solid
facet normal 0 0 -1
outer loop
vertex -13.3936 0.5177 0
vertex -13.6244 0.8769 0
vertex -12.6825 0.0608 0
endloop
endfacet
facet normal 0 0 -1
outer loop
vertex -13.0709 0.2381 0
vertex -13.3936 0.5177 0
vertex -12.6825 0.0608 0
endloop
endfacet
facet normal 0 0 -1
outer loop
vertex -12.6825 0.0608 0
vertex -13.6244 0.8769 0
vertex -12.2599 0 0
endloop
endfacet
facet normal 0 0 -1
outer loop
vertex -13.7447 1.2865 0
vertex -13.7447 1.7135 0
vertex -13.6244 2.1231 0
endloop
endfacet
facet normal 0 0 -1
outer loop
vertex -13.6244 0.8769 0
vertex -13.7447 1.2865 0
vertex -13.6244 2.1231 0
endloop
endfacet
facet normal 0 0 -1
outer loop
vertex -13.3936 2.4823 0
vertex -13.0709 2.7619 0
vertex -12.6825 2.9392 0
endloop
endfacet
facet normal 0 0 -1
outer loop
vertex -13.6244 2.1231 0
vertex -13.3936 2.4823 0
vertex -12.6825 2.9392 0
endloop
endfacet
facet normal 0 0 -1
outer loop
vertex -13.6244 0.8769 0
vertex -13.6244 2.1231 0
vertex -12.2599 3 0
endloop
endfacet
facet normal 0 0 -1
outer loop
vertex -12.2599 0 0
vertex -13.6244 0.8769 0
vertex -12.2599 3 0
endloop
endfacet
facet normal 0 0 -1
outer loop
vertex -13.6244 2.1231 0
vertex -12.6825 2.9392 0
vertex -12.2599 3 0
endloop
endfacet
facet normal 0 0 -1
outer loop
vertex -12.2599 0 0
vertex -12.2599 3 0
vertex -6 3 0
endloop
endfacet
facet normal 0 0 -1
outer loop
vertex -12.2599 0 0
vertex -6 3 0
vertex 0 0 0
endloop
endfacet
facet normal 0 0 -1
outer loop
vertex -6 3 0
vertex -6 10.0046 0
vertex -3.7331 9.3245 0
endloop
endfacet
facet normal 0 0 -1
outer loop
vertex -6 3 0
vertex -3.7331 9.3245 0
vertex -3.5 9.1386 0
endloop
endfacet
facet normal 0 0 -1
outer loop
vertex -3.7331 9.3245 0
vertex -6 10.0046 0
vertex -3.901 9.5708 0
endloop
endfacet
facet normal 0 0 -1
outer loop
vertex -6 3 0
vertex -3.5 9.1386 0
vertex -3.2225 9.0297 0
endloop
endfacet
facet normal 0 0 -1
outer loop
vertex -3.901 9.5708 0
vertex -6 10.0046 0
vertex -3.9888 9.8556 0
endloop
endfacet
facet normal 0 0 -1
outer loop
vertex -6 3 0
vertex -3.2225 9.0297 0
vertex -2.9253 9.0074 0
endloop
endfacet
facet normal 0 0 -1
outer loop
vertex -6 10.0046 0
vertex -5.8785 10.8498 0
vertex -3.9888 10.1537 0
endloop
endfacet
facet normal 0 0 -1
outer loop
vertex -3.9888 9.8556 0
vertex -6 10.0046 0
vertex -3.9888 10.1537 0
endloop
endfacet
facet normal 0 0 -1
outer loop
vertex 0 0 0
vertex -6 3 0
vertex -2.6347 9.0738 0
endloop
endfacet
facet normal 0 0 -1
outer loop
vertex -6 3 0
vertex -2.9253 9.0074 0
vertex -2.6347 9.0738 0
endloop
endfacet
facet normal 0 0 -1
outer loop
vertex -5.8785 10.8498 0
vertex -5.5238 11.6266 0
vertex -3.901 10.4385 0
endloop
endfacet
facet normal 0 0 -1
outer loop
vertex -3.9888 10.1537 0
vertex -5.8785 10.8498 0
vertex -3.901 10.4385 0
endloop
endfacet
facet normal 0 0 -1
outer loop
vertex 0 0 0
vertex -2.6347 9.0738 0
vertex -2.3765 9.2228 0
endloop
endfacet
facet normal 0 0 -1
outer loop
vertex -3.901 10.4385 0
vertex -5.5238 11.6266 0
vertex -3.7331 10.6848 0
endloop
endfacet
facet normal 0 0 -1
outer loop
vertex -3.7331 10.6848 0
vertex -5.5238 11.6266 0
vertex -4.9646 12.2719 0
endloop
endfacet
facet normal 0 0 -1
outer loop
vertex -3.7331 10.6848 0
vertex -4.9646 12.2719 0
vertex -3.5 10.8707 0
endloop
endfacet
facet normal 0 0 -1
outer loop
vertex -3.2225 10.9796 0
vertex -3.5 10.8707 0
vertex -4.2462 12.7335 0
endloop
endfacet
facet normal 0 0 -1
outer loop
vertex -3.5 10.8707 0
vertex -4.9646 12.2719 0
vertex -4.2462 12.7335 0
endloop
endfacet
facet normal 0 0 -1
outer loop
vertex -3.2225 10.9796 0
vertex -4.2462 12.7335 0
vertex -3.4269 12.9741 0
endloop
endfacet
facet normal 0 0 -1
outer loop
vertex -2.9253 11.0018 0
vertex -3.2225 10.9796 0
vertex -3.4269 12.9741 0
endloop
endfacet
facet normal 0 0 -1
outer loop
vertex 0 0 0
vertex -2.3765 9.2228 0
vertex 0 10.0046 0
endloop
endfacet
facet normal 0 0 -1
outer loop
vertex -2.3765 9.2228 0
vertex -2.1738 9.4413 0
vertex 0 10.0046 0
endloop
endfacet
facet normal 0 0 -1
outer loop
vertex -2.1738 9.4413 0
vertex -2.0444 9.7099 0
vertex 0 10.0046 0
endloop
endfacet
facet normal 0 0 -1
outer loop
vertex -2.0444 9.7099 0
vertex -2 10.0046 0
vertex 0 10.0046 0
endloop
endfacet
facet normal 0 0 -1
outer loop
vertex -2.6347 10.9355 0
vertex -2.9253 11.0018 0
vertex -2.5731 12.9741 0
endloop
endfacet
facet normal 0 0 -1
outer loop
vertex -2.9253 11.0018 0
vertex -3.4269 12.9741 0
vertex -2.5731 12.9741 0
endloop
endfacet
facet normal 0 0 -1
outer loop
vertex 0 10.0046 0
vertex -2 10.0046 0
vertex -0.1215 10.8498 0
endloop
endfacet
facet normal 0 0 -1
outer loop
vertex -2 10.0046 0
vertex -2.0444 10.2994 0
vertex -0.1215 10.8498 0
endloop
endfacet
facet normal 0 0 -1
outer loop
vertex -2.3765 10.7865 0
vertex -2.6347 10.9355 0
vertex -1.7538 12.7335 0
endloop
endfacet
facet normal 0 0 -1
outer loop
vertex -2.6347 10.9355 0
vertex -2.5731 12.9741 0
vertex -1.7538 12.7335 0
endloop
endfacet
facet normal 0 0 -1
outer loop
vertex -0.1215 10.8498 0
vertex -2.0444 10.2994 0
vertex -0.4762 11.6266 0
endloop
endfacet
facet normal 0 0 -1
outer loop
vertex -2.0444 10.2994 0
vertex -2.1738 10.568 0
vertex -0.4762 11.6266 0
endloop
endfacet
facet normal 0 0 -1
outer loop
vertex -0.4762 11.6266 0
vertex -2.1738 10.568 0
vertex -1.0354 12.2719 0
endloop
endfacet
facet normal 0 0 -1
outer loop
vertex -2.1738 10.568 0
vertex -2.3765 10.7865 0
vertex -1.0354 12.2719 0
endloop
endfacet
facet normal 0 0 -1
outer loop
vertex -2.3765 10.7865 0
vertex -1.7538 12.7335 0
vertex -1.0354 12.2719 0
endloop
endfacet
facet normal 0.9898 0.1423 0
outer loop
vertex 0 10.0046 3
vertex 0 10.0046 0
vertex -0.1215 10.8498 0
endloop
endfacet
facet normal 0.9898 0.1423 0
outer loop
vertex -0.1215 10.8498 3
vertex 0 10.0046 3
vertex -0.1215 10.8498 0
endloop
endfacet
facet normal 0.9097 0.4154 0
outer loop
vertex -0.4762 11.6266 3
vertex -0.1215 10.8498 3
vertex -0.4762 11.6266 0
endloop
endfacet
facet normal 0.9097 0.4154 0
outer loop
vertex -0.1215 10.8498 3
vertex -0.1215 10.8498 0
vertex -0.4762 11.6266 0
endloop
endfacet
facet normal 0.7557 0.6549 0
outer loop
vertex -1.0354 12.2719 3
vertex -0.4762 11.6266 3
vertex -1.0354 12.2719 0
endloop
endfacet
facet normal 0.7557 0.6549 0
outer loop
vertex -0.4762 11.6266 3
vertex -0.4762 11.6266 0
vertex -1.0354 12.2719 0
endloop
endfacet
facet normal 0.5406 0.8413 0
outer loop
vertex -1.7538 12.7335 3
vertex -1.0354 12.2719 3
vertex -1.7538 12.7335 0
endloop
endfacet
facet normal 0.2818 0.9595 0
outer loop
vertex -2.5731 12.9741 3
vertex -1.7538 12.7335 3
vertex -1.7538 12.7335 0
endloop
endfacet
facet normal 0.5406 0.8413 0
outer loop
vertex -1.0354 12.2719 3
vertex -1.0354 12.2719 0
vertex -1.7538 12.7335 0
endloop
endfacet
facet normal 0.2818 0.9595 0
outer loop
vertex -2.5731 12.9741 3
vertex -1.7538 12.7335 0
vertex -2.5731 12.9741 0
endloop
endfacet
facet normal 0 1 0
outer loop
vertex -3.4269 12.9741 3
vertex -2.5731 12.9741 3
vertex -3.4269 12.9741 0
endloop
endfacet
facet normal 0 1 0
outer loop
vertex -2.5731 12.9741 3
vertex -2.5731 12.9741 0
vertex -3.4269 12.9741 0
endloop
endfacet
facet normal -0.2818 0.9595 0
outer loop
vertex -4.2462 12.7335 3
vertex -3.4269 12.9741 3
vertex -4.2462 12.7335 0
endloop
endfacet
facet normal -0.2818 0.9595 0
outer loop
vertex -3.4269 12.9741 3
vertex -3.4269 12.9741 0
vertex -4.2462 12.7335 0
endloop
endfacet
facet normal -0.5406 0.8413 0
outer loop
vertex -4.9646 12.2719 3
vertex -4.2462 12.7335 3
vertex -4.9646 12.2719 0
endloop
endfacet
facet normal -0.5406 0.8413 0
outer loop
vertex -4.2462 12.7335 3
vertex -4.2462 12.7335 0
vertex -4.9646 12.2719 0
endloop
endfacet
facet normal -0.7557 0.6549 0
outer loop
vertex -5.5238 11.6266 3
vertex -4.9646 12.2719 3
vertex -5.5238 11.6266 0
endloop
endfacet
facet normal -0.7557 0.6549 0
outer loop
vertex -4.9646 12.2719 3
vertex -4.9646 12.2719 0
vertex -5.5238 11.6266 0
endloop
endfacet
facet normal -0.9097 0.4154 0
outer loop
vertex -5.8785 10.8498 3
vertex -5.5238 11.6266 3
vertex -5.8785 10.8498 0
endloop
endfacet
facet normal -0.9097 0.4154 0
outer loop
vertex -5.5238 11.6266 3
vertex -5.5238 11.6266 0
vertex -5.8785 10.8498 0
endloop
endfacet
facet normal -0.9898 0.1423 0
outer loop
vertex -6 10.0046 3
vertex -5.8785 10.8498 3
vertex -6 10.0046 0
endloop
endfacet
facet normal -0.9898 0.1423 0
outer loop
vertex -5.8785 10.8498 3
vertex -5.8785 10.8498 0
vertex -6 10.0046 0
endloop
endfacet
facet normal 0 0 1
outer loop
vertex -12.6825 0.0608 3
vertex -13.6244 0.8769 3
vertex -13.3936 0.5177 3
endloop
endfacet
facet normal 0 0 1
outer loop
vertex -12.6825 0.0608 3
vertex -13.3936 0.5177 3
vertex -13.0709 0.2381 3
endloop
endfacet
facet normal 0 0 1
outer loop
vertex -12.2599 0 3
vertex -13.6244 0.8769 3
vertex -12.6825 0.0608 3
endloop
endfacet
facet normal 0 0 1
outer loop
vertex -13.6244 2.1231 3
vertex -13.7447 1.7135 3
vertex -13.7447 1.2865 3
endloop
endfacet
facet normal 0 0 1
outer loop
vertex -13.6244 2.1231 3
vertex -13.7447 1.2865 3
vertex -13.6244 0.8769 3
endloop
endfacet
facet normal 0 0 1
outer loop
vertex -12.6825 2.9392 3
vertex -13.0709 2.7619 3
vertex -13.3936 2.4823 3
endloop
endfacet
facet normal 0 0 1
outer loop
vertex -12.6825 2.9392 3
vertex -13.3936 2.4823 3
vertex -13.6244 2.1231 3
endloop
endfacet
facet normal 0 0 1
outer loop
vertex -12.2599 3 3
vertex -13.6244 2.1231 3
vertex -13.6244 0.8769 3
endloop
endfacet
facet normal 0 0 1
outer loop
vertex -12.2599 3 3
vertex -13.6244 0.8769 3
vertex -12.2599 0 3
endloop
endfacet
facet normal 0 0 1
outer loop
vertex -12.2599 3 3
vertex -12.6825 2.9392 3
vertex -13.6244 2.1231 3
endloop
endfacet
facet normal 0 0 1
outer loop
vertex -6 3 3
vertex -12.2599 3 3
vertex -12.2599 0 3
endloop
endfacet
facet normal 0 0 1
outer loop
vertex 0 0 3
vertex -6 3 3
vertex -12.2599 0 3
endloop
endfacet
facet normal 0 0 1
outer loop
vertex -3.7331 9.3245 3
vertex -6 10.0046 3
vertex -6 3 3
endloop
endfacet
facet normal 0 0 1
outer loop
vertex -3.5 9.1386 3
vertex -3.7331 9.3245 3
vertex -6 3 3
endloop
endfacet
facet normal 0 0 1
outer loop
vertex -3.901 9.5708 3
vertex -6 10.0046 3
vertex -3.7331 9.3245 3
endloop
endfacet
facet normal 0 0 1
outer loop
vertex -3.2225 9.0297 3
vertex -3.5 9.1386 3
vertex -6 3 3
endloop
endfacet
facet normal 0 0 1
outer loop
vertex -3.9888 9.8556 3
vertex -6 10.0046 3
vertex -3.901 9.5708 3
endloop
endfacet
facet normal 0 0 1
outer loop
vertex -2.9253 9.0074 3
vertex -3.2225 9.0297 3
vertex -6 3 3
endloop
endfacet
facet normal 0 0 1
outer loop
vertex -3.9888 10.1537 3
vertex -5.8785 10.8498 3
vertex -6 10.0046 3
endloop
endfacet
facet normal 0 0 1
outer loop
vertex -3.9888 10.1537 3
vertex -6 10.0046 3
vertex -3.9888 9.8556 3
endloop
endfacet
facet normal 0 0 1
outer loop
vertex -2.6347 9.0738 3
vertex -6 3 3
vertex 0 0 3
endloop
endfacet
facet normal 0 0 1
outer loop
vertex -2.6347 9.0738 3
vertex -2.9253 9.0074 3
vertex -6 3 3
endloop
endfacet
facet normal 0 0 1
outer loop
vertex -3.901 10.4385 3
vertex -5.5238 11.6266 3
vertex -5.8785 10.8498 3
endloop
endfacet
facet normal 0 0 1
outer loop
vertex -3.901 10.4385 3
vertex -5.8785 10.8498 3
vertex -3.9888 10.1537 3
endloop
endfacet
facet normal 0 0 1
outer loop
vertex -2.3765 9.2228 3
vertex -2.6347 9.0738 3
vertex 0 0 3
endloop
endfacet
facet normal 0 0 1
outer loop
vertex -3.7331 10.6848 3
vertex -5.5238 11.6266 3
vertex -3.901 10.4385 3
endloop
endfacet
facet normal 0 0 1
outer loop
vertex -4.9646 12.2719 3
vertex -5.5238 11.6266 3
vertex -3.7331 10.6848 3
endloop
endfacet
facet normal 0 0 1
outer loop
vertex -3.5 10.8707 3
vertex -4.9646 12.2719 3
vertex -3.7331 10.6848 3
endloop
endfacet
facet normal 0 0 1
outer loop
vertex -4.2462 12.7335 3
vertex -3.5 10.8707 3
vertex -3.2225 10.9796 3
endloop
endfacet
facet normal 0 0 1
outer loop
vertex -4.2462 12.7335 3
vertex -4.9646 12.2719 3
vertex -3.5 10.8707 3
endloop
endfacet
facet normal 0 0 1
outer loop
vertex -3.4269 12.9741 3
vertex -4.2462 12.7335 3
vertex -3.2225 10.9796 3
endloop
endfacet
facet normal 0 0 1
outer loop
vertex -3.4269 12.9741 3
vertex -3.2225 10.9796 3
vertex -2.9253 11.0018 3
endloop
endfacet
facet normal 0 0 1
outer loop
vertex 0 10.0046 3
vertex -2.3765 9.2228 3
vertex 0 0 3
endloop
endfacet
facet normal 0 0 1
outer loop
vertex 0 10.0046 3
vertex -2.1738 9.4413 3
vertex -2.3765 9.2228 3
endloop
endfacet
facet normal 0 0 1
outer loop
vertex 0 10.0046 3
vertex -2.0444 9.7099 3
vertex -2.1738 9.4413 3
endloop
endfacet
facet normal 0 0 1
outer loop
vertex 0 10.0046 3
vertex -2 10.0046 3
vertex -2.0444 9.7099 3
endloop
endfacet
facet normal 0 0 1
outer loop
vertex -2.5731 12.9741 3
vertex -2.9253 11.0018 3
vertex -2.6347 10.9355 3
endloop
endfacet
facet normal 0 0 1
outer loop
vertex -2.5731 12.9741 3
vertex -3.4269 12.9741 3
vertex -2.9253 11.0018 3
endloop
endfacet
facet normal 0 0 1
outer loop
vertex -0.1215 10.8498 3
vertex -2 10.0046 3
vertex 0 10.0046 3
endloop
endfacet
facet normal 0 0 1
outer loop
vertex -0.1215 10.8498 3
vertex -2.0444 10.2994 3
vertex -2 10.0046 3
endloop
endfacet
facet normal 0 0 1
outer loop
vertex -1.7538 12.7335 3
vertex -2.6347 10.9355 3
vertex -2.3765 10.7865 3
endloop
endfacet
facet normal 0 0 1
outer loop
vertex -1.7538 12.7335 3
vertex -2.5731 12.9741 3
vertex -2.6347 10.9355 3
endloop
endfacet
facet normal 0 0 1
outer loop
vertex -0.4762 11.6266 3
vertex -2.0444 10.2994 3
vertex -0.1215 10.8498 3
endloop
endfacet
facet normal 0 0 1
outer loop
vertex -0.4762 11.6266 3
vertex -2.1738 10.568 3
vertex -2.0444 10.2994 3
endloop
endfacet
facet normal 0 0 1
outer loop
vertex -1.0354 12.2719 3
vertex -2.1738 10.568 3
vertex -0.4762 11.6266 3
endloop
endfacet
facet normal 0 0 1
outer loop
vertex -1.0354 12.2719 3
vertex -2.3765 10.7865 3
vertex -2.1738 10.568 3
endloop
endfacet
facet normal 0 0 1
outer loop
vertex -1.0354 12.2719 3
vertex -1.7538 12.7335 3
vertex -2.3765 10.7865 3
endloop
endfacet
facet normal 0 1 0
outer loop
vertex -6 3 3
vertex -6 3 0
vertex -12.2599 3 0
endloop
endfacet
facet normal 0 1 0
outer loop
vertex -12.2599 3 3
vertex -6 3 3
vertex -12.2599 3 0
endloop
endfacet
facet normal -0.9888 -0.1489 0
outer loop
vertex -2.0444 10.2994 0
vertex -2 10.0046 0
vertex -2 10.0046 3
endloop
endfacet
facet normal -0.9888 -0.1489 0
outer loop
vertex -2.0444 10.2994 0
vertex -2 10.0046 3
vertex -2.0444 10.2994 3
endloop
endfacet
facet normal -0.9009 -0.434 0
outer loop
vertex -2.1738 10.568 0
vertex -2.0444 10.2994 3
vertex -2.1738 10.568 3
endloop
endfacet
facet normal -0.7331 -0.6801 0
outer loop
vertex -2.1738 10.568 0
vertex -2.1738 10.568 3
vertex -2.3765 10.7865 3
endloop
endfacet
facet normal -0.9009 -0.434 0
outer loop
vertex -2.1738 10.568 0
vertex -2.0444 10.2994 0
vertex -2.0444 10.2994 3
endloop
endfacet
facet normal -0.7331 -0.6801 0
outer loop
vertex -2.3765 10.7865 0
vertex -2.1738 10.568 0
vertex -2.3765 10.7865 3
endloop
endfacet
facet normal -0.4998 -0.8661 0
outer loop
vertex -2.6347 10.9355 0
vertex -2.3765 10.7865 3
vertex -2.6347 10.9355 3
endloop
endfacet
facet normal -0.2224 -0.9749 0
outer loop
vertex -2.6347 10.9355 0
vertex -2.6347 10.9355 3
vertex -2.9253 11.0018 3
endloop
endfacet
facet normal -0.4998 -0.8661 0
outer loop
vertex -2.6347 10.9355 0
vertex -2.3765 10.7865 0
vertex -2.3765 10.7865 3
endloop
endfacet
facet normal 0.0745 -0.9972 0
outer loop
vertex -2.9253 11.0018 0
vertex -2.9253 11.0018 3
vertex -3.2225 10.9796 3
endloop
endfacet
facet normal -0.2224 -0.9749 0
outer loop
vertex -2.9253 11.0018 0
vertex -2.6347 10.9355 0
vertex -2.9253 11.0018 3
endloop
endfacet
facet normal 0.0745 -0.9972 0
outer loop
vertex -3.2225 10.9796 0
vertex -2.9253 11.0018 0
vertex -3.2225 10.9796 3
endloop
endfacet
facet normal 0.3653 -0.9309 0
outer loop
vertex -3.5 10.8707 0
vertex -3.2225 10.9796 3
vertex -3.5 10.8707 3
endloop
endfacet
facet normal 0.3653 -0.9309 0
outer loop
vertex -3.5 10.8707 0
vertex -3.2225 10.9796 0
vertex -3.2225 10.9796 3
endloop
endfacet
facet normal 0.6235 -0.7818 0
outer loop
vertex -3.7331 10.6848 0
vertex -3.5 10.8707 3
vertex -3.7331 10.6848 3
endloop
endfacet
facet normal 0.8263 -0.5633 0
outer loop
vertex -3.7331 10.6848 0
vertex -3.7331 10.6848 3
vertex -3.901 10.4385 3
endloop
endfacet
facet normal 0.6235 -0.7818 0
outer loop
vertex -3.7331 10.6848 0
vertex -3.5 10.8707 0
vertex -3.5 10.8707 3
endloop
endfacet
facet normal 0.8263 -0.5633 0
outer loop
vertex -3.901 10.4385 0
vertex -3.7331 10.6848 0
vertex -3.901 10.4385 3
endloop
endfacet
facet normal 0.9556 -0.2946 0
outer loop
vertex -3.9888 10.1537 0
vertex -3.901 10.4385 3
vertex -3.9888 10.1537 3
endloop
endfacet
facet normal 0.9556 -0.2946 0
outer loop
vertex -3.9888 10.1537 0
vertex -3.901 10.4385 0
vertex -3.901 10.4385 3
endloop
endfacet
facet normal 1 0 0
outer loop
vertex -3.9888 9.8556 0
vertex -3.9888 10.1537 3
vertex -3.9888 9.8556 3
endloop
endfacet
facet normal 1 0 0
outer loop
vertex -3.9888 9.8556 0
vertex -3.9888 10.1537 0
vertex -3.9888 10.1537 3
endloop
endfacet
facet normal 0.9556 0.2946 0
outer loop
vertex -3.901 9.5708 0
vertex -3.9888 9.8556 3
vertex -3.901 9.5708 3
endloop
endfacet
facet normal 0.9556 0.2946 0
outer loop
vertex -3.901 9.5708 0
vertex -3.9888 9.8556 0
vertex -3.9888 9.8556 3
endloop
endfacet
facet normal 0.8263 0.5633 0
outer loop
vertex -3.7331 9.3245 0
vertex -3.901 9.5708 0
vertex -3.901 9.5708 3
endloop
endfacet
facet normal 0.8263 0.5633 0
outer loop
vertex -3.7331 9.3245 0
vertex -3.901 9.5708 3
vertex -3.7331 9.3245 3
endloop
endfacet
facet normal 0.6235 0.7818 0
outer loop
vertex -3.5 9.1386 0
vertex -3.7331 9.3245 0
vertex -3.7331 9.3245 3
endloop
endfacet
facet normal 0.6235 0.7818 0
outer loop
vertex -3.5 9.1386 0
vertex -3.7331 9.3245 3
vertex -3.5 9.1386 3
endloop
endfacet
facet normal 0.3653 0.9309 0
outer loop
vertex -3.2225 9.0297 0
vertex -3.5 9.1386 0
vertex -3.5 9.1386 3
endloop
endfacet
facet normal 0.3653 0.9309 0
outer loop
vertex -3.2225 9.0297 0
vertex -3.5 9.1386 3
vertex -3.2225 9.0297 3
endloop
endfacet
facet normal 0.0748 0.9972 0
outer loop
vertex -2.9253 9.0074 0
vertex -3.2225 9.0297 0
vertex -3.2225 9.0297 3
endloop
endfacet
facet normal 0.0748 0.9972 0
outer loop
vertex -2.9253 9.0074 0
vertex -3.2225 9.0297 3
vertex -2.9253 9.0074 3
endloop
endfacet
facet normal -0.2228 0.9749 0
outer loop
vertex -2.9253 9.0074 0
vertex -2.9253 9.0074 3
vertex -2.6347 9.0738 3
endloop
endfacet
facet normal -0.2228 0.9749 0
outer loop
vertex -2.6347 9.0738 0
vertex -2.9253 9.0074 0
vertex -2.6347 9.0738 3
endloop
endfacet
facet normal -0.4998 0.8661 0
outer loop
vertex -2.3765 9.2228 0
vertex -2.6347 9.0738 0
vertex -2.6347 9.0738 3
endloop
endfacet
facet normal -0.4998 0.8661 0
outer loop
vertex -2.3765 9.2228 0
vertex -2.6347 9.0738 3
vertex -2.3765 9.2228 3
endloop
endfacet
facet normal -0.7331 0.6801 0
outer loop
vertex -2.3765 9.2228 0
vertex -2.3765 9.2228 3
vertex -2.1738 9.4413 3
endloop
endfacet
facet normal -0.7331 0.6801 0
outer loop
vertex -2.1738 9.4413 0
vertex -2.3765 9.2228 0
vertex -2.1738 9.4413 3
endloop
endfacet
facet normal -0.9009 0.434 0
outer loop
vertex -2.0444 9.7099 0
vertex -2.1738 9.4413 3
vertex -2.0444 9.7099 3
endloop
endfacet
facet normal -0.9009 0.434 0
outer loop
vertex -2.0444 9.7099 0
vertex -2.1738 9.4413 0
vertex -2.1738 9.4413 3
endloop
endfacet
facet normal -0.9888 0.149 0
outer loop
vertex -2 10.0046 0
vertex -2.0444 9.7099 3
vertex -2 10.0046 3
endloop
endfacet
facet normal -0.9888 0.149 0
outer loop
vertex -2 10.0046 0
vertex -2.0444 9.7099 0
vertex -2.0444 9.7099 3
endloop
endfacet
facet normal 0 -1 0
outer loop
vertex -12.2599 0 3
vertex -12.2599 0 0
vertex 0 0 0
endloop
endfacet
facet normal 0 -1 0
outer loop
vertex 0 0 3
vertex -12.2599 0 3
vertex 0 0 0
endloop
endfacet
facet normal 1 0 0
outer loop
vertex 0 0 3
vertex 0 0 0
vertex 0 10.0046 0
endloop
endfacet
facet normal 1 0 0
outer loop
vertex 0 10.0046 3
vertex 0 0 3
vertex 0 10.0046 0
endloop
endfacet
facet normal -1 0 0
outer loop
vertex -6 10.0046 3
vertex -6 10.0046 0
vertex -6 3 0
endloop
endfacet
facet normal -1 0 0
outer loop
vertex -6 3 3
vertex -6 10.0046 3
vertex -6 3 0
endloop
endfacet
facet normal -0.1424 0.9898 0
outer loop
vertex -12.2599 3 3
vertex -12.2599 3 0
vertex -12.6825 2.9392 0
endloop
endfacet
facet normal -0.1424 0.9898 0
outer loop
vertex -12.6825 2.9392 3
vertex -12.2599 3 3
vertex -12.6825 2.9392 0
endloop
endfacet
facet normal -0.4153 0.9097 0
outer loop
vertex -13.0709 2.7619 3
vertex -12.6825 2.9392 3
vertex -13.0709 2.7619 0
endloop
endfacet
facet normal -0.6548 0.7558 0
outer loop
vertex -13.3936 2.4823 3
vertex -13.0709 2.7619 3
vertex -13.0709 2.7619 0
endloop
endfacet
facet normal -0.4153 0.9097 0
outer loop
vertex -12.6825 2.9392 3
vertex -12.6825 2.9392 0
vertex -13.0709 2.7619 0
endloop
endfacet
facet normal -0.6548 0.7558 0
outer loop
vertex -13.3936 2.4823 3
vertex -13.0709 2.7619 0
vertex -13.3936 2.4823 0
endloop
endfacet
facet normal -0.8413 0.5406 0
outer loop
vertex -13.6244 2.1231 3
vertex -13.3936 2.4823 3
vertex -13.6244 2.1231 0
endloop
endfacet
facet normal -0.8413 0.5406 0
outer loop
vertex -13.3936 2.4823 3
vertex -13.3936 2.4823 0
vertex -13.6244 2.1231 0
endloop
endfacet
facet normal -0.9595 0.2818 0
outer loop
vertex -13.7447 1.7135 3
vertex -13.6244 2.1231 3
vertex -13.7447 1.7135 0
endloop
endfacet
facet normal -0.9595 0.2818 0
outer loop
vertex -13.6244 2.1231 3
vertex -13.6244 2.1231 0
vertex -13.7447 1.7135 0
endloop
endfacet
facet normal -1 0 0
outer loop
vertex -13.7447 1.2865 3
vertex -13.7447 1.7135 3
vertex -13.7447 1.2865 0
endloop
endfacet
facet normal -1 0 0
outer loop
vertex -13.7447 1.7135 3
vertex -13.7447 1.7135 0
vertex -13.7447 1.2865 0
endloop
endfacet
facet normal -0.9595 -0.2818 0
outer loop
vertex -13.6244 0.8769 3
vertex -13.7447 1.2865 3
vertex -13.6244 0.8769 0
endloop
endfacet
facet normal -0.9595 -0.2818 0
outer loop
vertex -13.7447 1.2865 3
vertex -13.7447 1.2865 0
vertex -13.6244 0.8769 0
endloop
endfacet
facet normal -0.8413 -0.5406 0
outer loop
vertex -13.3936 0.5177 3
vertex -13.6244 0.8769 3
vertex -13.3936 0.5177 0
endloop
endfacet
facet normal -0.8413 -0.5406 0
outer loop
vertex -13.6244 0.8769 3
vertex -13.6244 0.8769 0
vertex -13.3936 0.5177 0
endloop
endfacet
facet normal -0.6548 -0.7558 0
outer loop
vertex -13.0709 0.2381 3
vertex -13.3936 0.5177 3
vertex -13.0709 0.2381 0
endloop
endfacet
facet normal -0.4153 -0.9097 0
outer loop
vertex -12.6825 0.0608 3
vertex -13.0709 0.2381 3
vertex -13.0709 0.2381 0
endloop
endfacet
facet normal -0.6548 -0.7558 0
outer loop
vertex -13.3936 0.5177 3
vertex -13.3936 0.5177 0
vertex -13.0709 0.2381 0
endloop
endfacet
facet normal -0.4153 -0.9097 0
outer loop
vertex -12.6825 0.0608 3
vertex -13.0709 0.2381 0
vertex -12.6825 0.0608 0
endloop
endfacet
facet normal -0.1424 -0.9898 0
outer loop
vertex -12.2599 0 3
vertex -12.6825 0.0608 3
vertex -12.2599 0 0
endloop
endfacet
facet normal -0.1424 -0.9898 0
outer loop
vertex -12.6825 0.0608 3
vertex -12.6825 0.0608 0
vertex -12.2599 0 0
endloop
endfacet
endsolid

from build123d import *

# Parameters (mm, degrees)
F0_R     = 1
F1_DEPTH = 3


with BuildPart() as f1:
    # F0 (on Top) → F1 (new body)
    with BuildSketch(Plane.XY):
        with BuildLine():
            Line((-6, 3), (-12.259949, 3))
            ThreePointArc((-12.259949, 3), (-13.759949, 1.5), (-12.259949, 0))
            Line((-12.259949, 0), (0, 0))
            Line((0, 0), (0, 10.004636))
            ThreePointArc((0, 10.004636), (-3, 13.004636), (-6, 10.004636))
            Line((-6, 10.004636), (-6, 3))
        make_face()
        with Locations((-3, 10.004636)):
            Circle(F0_R, mode=Mode.SUBTRACT)
    extrude(amount=F1_DEPTH)


solid = f1.part
